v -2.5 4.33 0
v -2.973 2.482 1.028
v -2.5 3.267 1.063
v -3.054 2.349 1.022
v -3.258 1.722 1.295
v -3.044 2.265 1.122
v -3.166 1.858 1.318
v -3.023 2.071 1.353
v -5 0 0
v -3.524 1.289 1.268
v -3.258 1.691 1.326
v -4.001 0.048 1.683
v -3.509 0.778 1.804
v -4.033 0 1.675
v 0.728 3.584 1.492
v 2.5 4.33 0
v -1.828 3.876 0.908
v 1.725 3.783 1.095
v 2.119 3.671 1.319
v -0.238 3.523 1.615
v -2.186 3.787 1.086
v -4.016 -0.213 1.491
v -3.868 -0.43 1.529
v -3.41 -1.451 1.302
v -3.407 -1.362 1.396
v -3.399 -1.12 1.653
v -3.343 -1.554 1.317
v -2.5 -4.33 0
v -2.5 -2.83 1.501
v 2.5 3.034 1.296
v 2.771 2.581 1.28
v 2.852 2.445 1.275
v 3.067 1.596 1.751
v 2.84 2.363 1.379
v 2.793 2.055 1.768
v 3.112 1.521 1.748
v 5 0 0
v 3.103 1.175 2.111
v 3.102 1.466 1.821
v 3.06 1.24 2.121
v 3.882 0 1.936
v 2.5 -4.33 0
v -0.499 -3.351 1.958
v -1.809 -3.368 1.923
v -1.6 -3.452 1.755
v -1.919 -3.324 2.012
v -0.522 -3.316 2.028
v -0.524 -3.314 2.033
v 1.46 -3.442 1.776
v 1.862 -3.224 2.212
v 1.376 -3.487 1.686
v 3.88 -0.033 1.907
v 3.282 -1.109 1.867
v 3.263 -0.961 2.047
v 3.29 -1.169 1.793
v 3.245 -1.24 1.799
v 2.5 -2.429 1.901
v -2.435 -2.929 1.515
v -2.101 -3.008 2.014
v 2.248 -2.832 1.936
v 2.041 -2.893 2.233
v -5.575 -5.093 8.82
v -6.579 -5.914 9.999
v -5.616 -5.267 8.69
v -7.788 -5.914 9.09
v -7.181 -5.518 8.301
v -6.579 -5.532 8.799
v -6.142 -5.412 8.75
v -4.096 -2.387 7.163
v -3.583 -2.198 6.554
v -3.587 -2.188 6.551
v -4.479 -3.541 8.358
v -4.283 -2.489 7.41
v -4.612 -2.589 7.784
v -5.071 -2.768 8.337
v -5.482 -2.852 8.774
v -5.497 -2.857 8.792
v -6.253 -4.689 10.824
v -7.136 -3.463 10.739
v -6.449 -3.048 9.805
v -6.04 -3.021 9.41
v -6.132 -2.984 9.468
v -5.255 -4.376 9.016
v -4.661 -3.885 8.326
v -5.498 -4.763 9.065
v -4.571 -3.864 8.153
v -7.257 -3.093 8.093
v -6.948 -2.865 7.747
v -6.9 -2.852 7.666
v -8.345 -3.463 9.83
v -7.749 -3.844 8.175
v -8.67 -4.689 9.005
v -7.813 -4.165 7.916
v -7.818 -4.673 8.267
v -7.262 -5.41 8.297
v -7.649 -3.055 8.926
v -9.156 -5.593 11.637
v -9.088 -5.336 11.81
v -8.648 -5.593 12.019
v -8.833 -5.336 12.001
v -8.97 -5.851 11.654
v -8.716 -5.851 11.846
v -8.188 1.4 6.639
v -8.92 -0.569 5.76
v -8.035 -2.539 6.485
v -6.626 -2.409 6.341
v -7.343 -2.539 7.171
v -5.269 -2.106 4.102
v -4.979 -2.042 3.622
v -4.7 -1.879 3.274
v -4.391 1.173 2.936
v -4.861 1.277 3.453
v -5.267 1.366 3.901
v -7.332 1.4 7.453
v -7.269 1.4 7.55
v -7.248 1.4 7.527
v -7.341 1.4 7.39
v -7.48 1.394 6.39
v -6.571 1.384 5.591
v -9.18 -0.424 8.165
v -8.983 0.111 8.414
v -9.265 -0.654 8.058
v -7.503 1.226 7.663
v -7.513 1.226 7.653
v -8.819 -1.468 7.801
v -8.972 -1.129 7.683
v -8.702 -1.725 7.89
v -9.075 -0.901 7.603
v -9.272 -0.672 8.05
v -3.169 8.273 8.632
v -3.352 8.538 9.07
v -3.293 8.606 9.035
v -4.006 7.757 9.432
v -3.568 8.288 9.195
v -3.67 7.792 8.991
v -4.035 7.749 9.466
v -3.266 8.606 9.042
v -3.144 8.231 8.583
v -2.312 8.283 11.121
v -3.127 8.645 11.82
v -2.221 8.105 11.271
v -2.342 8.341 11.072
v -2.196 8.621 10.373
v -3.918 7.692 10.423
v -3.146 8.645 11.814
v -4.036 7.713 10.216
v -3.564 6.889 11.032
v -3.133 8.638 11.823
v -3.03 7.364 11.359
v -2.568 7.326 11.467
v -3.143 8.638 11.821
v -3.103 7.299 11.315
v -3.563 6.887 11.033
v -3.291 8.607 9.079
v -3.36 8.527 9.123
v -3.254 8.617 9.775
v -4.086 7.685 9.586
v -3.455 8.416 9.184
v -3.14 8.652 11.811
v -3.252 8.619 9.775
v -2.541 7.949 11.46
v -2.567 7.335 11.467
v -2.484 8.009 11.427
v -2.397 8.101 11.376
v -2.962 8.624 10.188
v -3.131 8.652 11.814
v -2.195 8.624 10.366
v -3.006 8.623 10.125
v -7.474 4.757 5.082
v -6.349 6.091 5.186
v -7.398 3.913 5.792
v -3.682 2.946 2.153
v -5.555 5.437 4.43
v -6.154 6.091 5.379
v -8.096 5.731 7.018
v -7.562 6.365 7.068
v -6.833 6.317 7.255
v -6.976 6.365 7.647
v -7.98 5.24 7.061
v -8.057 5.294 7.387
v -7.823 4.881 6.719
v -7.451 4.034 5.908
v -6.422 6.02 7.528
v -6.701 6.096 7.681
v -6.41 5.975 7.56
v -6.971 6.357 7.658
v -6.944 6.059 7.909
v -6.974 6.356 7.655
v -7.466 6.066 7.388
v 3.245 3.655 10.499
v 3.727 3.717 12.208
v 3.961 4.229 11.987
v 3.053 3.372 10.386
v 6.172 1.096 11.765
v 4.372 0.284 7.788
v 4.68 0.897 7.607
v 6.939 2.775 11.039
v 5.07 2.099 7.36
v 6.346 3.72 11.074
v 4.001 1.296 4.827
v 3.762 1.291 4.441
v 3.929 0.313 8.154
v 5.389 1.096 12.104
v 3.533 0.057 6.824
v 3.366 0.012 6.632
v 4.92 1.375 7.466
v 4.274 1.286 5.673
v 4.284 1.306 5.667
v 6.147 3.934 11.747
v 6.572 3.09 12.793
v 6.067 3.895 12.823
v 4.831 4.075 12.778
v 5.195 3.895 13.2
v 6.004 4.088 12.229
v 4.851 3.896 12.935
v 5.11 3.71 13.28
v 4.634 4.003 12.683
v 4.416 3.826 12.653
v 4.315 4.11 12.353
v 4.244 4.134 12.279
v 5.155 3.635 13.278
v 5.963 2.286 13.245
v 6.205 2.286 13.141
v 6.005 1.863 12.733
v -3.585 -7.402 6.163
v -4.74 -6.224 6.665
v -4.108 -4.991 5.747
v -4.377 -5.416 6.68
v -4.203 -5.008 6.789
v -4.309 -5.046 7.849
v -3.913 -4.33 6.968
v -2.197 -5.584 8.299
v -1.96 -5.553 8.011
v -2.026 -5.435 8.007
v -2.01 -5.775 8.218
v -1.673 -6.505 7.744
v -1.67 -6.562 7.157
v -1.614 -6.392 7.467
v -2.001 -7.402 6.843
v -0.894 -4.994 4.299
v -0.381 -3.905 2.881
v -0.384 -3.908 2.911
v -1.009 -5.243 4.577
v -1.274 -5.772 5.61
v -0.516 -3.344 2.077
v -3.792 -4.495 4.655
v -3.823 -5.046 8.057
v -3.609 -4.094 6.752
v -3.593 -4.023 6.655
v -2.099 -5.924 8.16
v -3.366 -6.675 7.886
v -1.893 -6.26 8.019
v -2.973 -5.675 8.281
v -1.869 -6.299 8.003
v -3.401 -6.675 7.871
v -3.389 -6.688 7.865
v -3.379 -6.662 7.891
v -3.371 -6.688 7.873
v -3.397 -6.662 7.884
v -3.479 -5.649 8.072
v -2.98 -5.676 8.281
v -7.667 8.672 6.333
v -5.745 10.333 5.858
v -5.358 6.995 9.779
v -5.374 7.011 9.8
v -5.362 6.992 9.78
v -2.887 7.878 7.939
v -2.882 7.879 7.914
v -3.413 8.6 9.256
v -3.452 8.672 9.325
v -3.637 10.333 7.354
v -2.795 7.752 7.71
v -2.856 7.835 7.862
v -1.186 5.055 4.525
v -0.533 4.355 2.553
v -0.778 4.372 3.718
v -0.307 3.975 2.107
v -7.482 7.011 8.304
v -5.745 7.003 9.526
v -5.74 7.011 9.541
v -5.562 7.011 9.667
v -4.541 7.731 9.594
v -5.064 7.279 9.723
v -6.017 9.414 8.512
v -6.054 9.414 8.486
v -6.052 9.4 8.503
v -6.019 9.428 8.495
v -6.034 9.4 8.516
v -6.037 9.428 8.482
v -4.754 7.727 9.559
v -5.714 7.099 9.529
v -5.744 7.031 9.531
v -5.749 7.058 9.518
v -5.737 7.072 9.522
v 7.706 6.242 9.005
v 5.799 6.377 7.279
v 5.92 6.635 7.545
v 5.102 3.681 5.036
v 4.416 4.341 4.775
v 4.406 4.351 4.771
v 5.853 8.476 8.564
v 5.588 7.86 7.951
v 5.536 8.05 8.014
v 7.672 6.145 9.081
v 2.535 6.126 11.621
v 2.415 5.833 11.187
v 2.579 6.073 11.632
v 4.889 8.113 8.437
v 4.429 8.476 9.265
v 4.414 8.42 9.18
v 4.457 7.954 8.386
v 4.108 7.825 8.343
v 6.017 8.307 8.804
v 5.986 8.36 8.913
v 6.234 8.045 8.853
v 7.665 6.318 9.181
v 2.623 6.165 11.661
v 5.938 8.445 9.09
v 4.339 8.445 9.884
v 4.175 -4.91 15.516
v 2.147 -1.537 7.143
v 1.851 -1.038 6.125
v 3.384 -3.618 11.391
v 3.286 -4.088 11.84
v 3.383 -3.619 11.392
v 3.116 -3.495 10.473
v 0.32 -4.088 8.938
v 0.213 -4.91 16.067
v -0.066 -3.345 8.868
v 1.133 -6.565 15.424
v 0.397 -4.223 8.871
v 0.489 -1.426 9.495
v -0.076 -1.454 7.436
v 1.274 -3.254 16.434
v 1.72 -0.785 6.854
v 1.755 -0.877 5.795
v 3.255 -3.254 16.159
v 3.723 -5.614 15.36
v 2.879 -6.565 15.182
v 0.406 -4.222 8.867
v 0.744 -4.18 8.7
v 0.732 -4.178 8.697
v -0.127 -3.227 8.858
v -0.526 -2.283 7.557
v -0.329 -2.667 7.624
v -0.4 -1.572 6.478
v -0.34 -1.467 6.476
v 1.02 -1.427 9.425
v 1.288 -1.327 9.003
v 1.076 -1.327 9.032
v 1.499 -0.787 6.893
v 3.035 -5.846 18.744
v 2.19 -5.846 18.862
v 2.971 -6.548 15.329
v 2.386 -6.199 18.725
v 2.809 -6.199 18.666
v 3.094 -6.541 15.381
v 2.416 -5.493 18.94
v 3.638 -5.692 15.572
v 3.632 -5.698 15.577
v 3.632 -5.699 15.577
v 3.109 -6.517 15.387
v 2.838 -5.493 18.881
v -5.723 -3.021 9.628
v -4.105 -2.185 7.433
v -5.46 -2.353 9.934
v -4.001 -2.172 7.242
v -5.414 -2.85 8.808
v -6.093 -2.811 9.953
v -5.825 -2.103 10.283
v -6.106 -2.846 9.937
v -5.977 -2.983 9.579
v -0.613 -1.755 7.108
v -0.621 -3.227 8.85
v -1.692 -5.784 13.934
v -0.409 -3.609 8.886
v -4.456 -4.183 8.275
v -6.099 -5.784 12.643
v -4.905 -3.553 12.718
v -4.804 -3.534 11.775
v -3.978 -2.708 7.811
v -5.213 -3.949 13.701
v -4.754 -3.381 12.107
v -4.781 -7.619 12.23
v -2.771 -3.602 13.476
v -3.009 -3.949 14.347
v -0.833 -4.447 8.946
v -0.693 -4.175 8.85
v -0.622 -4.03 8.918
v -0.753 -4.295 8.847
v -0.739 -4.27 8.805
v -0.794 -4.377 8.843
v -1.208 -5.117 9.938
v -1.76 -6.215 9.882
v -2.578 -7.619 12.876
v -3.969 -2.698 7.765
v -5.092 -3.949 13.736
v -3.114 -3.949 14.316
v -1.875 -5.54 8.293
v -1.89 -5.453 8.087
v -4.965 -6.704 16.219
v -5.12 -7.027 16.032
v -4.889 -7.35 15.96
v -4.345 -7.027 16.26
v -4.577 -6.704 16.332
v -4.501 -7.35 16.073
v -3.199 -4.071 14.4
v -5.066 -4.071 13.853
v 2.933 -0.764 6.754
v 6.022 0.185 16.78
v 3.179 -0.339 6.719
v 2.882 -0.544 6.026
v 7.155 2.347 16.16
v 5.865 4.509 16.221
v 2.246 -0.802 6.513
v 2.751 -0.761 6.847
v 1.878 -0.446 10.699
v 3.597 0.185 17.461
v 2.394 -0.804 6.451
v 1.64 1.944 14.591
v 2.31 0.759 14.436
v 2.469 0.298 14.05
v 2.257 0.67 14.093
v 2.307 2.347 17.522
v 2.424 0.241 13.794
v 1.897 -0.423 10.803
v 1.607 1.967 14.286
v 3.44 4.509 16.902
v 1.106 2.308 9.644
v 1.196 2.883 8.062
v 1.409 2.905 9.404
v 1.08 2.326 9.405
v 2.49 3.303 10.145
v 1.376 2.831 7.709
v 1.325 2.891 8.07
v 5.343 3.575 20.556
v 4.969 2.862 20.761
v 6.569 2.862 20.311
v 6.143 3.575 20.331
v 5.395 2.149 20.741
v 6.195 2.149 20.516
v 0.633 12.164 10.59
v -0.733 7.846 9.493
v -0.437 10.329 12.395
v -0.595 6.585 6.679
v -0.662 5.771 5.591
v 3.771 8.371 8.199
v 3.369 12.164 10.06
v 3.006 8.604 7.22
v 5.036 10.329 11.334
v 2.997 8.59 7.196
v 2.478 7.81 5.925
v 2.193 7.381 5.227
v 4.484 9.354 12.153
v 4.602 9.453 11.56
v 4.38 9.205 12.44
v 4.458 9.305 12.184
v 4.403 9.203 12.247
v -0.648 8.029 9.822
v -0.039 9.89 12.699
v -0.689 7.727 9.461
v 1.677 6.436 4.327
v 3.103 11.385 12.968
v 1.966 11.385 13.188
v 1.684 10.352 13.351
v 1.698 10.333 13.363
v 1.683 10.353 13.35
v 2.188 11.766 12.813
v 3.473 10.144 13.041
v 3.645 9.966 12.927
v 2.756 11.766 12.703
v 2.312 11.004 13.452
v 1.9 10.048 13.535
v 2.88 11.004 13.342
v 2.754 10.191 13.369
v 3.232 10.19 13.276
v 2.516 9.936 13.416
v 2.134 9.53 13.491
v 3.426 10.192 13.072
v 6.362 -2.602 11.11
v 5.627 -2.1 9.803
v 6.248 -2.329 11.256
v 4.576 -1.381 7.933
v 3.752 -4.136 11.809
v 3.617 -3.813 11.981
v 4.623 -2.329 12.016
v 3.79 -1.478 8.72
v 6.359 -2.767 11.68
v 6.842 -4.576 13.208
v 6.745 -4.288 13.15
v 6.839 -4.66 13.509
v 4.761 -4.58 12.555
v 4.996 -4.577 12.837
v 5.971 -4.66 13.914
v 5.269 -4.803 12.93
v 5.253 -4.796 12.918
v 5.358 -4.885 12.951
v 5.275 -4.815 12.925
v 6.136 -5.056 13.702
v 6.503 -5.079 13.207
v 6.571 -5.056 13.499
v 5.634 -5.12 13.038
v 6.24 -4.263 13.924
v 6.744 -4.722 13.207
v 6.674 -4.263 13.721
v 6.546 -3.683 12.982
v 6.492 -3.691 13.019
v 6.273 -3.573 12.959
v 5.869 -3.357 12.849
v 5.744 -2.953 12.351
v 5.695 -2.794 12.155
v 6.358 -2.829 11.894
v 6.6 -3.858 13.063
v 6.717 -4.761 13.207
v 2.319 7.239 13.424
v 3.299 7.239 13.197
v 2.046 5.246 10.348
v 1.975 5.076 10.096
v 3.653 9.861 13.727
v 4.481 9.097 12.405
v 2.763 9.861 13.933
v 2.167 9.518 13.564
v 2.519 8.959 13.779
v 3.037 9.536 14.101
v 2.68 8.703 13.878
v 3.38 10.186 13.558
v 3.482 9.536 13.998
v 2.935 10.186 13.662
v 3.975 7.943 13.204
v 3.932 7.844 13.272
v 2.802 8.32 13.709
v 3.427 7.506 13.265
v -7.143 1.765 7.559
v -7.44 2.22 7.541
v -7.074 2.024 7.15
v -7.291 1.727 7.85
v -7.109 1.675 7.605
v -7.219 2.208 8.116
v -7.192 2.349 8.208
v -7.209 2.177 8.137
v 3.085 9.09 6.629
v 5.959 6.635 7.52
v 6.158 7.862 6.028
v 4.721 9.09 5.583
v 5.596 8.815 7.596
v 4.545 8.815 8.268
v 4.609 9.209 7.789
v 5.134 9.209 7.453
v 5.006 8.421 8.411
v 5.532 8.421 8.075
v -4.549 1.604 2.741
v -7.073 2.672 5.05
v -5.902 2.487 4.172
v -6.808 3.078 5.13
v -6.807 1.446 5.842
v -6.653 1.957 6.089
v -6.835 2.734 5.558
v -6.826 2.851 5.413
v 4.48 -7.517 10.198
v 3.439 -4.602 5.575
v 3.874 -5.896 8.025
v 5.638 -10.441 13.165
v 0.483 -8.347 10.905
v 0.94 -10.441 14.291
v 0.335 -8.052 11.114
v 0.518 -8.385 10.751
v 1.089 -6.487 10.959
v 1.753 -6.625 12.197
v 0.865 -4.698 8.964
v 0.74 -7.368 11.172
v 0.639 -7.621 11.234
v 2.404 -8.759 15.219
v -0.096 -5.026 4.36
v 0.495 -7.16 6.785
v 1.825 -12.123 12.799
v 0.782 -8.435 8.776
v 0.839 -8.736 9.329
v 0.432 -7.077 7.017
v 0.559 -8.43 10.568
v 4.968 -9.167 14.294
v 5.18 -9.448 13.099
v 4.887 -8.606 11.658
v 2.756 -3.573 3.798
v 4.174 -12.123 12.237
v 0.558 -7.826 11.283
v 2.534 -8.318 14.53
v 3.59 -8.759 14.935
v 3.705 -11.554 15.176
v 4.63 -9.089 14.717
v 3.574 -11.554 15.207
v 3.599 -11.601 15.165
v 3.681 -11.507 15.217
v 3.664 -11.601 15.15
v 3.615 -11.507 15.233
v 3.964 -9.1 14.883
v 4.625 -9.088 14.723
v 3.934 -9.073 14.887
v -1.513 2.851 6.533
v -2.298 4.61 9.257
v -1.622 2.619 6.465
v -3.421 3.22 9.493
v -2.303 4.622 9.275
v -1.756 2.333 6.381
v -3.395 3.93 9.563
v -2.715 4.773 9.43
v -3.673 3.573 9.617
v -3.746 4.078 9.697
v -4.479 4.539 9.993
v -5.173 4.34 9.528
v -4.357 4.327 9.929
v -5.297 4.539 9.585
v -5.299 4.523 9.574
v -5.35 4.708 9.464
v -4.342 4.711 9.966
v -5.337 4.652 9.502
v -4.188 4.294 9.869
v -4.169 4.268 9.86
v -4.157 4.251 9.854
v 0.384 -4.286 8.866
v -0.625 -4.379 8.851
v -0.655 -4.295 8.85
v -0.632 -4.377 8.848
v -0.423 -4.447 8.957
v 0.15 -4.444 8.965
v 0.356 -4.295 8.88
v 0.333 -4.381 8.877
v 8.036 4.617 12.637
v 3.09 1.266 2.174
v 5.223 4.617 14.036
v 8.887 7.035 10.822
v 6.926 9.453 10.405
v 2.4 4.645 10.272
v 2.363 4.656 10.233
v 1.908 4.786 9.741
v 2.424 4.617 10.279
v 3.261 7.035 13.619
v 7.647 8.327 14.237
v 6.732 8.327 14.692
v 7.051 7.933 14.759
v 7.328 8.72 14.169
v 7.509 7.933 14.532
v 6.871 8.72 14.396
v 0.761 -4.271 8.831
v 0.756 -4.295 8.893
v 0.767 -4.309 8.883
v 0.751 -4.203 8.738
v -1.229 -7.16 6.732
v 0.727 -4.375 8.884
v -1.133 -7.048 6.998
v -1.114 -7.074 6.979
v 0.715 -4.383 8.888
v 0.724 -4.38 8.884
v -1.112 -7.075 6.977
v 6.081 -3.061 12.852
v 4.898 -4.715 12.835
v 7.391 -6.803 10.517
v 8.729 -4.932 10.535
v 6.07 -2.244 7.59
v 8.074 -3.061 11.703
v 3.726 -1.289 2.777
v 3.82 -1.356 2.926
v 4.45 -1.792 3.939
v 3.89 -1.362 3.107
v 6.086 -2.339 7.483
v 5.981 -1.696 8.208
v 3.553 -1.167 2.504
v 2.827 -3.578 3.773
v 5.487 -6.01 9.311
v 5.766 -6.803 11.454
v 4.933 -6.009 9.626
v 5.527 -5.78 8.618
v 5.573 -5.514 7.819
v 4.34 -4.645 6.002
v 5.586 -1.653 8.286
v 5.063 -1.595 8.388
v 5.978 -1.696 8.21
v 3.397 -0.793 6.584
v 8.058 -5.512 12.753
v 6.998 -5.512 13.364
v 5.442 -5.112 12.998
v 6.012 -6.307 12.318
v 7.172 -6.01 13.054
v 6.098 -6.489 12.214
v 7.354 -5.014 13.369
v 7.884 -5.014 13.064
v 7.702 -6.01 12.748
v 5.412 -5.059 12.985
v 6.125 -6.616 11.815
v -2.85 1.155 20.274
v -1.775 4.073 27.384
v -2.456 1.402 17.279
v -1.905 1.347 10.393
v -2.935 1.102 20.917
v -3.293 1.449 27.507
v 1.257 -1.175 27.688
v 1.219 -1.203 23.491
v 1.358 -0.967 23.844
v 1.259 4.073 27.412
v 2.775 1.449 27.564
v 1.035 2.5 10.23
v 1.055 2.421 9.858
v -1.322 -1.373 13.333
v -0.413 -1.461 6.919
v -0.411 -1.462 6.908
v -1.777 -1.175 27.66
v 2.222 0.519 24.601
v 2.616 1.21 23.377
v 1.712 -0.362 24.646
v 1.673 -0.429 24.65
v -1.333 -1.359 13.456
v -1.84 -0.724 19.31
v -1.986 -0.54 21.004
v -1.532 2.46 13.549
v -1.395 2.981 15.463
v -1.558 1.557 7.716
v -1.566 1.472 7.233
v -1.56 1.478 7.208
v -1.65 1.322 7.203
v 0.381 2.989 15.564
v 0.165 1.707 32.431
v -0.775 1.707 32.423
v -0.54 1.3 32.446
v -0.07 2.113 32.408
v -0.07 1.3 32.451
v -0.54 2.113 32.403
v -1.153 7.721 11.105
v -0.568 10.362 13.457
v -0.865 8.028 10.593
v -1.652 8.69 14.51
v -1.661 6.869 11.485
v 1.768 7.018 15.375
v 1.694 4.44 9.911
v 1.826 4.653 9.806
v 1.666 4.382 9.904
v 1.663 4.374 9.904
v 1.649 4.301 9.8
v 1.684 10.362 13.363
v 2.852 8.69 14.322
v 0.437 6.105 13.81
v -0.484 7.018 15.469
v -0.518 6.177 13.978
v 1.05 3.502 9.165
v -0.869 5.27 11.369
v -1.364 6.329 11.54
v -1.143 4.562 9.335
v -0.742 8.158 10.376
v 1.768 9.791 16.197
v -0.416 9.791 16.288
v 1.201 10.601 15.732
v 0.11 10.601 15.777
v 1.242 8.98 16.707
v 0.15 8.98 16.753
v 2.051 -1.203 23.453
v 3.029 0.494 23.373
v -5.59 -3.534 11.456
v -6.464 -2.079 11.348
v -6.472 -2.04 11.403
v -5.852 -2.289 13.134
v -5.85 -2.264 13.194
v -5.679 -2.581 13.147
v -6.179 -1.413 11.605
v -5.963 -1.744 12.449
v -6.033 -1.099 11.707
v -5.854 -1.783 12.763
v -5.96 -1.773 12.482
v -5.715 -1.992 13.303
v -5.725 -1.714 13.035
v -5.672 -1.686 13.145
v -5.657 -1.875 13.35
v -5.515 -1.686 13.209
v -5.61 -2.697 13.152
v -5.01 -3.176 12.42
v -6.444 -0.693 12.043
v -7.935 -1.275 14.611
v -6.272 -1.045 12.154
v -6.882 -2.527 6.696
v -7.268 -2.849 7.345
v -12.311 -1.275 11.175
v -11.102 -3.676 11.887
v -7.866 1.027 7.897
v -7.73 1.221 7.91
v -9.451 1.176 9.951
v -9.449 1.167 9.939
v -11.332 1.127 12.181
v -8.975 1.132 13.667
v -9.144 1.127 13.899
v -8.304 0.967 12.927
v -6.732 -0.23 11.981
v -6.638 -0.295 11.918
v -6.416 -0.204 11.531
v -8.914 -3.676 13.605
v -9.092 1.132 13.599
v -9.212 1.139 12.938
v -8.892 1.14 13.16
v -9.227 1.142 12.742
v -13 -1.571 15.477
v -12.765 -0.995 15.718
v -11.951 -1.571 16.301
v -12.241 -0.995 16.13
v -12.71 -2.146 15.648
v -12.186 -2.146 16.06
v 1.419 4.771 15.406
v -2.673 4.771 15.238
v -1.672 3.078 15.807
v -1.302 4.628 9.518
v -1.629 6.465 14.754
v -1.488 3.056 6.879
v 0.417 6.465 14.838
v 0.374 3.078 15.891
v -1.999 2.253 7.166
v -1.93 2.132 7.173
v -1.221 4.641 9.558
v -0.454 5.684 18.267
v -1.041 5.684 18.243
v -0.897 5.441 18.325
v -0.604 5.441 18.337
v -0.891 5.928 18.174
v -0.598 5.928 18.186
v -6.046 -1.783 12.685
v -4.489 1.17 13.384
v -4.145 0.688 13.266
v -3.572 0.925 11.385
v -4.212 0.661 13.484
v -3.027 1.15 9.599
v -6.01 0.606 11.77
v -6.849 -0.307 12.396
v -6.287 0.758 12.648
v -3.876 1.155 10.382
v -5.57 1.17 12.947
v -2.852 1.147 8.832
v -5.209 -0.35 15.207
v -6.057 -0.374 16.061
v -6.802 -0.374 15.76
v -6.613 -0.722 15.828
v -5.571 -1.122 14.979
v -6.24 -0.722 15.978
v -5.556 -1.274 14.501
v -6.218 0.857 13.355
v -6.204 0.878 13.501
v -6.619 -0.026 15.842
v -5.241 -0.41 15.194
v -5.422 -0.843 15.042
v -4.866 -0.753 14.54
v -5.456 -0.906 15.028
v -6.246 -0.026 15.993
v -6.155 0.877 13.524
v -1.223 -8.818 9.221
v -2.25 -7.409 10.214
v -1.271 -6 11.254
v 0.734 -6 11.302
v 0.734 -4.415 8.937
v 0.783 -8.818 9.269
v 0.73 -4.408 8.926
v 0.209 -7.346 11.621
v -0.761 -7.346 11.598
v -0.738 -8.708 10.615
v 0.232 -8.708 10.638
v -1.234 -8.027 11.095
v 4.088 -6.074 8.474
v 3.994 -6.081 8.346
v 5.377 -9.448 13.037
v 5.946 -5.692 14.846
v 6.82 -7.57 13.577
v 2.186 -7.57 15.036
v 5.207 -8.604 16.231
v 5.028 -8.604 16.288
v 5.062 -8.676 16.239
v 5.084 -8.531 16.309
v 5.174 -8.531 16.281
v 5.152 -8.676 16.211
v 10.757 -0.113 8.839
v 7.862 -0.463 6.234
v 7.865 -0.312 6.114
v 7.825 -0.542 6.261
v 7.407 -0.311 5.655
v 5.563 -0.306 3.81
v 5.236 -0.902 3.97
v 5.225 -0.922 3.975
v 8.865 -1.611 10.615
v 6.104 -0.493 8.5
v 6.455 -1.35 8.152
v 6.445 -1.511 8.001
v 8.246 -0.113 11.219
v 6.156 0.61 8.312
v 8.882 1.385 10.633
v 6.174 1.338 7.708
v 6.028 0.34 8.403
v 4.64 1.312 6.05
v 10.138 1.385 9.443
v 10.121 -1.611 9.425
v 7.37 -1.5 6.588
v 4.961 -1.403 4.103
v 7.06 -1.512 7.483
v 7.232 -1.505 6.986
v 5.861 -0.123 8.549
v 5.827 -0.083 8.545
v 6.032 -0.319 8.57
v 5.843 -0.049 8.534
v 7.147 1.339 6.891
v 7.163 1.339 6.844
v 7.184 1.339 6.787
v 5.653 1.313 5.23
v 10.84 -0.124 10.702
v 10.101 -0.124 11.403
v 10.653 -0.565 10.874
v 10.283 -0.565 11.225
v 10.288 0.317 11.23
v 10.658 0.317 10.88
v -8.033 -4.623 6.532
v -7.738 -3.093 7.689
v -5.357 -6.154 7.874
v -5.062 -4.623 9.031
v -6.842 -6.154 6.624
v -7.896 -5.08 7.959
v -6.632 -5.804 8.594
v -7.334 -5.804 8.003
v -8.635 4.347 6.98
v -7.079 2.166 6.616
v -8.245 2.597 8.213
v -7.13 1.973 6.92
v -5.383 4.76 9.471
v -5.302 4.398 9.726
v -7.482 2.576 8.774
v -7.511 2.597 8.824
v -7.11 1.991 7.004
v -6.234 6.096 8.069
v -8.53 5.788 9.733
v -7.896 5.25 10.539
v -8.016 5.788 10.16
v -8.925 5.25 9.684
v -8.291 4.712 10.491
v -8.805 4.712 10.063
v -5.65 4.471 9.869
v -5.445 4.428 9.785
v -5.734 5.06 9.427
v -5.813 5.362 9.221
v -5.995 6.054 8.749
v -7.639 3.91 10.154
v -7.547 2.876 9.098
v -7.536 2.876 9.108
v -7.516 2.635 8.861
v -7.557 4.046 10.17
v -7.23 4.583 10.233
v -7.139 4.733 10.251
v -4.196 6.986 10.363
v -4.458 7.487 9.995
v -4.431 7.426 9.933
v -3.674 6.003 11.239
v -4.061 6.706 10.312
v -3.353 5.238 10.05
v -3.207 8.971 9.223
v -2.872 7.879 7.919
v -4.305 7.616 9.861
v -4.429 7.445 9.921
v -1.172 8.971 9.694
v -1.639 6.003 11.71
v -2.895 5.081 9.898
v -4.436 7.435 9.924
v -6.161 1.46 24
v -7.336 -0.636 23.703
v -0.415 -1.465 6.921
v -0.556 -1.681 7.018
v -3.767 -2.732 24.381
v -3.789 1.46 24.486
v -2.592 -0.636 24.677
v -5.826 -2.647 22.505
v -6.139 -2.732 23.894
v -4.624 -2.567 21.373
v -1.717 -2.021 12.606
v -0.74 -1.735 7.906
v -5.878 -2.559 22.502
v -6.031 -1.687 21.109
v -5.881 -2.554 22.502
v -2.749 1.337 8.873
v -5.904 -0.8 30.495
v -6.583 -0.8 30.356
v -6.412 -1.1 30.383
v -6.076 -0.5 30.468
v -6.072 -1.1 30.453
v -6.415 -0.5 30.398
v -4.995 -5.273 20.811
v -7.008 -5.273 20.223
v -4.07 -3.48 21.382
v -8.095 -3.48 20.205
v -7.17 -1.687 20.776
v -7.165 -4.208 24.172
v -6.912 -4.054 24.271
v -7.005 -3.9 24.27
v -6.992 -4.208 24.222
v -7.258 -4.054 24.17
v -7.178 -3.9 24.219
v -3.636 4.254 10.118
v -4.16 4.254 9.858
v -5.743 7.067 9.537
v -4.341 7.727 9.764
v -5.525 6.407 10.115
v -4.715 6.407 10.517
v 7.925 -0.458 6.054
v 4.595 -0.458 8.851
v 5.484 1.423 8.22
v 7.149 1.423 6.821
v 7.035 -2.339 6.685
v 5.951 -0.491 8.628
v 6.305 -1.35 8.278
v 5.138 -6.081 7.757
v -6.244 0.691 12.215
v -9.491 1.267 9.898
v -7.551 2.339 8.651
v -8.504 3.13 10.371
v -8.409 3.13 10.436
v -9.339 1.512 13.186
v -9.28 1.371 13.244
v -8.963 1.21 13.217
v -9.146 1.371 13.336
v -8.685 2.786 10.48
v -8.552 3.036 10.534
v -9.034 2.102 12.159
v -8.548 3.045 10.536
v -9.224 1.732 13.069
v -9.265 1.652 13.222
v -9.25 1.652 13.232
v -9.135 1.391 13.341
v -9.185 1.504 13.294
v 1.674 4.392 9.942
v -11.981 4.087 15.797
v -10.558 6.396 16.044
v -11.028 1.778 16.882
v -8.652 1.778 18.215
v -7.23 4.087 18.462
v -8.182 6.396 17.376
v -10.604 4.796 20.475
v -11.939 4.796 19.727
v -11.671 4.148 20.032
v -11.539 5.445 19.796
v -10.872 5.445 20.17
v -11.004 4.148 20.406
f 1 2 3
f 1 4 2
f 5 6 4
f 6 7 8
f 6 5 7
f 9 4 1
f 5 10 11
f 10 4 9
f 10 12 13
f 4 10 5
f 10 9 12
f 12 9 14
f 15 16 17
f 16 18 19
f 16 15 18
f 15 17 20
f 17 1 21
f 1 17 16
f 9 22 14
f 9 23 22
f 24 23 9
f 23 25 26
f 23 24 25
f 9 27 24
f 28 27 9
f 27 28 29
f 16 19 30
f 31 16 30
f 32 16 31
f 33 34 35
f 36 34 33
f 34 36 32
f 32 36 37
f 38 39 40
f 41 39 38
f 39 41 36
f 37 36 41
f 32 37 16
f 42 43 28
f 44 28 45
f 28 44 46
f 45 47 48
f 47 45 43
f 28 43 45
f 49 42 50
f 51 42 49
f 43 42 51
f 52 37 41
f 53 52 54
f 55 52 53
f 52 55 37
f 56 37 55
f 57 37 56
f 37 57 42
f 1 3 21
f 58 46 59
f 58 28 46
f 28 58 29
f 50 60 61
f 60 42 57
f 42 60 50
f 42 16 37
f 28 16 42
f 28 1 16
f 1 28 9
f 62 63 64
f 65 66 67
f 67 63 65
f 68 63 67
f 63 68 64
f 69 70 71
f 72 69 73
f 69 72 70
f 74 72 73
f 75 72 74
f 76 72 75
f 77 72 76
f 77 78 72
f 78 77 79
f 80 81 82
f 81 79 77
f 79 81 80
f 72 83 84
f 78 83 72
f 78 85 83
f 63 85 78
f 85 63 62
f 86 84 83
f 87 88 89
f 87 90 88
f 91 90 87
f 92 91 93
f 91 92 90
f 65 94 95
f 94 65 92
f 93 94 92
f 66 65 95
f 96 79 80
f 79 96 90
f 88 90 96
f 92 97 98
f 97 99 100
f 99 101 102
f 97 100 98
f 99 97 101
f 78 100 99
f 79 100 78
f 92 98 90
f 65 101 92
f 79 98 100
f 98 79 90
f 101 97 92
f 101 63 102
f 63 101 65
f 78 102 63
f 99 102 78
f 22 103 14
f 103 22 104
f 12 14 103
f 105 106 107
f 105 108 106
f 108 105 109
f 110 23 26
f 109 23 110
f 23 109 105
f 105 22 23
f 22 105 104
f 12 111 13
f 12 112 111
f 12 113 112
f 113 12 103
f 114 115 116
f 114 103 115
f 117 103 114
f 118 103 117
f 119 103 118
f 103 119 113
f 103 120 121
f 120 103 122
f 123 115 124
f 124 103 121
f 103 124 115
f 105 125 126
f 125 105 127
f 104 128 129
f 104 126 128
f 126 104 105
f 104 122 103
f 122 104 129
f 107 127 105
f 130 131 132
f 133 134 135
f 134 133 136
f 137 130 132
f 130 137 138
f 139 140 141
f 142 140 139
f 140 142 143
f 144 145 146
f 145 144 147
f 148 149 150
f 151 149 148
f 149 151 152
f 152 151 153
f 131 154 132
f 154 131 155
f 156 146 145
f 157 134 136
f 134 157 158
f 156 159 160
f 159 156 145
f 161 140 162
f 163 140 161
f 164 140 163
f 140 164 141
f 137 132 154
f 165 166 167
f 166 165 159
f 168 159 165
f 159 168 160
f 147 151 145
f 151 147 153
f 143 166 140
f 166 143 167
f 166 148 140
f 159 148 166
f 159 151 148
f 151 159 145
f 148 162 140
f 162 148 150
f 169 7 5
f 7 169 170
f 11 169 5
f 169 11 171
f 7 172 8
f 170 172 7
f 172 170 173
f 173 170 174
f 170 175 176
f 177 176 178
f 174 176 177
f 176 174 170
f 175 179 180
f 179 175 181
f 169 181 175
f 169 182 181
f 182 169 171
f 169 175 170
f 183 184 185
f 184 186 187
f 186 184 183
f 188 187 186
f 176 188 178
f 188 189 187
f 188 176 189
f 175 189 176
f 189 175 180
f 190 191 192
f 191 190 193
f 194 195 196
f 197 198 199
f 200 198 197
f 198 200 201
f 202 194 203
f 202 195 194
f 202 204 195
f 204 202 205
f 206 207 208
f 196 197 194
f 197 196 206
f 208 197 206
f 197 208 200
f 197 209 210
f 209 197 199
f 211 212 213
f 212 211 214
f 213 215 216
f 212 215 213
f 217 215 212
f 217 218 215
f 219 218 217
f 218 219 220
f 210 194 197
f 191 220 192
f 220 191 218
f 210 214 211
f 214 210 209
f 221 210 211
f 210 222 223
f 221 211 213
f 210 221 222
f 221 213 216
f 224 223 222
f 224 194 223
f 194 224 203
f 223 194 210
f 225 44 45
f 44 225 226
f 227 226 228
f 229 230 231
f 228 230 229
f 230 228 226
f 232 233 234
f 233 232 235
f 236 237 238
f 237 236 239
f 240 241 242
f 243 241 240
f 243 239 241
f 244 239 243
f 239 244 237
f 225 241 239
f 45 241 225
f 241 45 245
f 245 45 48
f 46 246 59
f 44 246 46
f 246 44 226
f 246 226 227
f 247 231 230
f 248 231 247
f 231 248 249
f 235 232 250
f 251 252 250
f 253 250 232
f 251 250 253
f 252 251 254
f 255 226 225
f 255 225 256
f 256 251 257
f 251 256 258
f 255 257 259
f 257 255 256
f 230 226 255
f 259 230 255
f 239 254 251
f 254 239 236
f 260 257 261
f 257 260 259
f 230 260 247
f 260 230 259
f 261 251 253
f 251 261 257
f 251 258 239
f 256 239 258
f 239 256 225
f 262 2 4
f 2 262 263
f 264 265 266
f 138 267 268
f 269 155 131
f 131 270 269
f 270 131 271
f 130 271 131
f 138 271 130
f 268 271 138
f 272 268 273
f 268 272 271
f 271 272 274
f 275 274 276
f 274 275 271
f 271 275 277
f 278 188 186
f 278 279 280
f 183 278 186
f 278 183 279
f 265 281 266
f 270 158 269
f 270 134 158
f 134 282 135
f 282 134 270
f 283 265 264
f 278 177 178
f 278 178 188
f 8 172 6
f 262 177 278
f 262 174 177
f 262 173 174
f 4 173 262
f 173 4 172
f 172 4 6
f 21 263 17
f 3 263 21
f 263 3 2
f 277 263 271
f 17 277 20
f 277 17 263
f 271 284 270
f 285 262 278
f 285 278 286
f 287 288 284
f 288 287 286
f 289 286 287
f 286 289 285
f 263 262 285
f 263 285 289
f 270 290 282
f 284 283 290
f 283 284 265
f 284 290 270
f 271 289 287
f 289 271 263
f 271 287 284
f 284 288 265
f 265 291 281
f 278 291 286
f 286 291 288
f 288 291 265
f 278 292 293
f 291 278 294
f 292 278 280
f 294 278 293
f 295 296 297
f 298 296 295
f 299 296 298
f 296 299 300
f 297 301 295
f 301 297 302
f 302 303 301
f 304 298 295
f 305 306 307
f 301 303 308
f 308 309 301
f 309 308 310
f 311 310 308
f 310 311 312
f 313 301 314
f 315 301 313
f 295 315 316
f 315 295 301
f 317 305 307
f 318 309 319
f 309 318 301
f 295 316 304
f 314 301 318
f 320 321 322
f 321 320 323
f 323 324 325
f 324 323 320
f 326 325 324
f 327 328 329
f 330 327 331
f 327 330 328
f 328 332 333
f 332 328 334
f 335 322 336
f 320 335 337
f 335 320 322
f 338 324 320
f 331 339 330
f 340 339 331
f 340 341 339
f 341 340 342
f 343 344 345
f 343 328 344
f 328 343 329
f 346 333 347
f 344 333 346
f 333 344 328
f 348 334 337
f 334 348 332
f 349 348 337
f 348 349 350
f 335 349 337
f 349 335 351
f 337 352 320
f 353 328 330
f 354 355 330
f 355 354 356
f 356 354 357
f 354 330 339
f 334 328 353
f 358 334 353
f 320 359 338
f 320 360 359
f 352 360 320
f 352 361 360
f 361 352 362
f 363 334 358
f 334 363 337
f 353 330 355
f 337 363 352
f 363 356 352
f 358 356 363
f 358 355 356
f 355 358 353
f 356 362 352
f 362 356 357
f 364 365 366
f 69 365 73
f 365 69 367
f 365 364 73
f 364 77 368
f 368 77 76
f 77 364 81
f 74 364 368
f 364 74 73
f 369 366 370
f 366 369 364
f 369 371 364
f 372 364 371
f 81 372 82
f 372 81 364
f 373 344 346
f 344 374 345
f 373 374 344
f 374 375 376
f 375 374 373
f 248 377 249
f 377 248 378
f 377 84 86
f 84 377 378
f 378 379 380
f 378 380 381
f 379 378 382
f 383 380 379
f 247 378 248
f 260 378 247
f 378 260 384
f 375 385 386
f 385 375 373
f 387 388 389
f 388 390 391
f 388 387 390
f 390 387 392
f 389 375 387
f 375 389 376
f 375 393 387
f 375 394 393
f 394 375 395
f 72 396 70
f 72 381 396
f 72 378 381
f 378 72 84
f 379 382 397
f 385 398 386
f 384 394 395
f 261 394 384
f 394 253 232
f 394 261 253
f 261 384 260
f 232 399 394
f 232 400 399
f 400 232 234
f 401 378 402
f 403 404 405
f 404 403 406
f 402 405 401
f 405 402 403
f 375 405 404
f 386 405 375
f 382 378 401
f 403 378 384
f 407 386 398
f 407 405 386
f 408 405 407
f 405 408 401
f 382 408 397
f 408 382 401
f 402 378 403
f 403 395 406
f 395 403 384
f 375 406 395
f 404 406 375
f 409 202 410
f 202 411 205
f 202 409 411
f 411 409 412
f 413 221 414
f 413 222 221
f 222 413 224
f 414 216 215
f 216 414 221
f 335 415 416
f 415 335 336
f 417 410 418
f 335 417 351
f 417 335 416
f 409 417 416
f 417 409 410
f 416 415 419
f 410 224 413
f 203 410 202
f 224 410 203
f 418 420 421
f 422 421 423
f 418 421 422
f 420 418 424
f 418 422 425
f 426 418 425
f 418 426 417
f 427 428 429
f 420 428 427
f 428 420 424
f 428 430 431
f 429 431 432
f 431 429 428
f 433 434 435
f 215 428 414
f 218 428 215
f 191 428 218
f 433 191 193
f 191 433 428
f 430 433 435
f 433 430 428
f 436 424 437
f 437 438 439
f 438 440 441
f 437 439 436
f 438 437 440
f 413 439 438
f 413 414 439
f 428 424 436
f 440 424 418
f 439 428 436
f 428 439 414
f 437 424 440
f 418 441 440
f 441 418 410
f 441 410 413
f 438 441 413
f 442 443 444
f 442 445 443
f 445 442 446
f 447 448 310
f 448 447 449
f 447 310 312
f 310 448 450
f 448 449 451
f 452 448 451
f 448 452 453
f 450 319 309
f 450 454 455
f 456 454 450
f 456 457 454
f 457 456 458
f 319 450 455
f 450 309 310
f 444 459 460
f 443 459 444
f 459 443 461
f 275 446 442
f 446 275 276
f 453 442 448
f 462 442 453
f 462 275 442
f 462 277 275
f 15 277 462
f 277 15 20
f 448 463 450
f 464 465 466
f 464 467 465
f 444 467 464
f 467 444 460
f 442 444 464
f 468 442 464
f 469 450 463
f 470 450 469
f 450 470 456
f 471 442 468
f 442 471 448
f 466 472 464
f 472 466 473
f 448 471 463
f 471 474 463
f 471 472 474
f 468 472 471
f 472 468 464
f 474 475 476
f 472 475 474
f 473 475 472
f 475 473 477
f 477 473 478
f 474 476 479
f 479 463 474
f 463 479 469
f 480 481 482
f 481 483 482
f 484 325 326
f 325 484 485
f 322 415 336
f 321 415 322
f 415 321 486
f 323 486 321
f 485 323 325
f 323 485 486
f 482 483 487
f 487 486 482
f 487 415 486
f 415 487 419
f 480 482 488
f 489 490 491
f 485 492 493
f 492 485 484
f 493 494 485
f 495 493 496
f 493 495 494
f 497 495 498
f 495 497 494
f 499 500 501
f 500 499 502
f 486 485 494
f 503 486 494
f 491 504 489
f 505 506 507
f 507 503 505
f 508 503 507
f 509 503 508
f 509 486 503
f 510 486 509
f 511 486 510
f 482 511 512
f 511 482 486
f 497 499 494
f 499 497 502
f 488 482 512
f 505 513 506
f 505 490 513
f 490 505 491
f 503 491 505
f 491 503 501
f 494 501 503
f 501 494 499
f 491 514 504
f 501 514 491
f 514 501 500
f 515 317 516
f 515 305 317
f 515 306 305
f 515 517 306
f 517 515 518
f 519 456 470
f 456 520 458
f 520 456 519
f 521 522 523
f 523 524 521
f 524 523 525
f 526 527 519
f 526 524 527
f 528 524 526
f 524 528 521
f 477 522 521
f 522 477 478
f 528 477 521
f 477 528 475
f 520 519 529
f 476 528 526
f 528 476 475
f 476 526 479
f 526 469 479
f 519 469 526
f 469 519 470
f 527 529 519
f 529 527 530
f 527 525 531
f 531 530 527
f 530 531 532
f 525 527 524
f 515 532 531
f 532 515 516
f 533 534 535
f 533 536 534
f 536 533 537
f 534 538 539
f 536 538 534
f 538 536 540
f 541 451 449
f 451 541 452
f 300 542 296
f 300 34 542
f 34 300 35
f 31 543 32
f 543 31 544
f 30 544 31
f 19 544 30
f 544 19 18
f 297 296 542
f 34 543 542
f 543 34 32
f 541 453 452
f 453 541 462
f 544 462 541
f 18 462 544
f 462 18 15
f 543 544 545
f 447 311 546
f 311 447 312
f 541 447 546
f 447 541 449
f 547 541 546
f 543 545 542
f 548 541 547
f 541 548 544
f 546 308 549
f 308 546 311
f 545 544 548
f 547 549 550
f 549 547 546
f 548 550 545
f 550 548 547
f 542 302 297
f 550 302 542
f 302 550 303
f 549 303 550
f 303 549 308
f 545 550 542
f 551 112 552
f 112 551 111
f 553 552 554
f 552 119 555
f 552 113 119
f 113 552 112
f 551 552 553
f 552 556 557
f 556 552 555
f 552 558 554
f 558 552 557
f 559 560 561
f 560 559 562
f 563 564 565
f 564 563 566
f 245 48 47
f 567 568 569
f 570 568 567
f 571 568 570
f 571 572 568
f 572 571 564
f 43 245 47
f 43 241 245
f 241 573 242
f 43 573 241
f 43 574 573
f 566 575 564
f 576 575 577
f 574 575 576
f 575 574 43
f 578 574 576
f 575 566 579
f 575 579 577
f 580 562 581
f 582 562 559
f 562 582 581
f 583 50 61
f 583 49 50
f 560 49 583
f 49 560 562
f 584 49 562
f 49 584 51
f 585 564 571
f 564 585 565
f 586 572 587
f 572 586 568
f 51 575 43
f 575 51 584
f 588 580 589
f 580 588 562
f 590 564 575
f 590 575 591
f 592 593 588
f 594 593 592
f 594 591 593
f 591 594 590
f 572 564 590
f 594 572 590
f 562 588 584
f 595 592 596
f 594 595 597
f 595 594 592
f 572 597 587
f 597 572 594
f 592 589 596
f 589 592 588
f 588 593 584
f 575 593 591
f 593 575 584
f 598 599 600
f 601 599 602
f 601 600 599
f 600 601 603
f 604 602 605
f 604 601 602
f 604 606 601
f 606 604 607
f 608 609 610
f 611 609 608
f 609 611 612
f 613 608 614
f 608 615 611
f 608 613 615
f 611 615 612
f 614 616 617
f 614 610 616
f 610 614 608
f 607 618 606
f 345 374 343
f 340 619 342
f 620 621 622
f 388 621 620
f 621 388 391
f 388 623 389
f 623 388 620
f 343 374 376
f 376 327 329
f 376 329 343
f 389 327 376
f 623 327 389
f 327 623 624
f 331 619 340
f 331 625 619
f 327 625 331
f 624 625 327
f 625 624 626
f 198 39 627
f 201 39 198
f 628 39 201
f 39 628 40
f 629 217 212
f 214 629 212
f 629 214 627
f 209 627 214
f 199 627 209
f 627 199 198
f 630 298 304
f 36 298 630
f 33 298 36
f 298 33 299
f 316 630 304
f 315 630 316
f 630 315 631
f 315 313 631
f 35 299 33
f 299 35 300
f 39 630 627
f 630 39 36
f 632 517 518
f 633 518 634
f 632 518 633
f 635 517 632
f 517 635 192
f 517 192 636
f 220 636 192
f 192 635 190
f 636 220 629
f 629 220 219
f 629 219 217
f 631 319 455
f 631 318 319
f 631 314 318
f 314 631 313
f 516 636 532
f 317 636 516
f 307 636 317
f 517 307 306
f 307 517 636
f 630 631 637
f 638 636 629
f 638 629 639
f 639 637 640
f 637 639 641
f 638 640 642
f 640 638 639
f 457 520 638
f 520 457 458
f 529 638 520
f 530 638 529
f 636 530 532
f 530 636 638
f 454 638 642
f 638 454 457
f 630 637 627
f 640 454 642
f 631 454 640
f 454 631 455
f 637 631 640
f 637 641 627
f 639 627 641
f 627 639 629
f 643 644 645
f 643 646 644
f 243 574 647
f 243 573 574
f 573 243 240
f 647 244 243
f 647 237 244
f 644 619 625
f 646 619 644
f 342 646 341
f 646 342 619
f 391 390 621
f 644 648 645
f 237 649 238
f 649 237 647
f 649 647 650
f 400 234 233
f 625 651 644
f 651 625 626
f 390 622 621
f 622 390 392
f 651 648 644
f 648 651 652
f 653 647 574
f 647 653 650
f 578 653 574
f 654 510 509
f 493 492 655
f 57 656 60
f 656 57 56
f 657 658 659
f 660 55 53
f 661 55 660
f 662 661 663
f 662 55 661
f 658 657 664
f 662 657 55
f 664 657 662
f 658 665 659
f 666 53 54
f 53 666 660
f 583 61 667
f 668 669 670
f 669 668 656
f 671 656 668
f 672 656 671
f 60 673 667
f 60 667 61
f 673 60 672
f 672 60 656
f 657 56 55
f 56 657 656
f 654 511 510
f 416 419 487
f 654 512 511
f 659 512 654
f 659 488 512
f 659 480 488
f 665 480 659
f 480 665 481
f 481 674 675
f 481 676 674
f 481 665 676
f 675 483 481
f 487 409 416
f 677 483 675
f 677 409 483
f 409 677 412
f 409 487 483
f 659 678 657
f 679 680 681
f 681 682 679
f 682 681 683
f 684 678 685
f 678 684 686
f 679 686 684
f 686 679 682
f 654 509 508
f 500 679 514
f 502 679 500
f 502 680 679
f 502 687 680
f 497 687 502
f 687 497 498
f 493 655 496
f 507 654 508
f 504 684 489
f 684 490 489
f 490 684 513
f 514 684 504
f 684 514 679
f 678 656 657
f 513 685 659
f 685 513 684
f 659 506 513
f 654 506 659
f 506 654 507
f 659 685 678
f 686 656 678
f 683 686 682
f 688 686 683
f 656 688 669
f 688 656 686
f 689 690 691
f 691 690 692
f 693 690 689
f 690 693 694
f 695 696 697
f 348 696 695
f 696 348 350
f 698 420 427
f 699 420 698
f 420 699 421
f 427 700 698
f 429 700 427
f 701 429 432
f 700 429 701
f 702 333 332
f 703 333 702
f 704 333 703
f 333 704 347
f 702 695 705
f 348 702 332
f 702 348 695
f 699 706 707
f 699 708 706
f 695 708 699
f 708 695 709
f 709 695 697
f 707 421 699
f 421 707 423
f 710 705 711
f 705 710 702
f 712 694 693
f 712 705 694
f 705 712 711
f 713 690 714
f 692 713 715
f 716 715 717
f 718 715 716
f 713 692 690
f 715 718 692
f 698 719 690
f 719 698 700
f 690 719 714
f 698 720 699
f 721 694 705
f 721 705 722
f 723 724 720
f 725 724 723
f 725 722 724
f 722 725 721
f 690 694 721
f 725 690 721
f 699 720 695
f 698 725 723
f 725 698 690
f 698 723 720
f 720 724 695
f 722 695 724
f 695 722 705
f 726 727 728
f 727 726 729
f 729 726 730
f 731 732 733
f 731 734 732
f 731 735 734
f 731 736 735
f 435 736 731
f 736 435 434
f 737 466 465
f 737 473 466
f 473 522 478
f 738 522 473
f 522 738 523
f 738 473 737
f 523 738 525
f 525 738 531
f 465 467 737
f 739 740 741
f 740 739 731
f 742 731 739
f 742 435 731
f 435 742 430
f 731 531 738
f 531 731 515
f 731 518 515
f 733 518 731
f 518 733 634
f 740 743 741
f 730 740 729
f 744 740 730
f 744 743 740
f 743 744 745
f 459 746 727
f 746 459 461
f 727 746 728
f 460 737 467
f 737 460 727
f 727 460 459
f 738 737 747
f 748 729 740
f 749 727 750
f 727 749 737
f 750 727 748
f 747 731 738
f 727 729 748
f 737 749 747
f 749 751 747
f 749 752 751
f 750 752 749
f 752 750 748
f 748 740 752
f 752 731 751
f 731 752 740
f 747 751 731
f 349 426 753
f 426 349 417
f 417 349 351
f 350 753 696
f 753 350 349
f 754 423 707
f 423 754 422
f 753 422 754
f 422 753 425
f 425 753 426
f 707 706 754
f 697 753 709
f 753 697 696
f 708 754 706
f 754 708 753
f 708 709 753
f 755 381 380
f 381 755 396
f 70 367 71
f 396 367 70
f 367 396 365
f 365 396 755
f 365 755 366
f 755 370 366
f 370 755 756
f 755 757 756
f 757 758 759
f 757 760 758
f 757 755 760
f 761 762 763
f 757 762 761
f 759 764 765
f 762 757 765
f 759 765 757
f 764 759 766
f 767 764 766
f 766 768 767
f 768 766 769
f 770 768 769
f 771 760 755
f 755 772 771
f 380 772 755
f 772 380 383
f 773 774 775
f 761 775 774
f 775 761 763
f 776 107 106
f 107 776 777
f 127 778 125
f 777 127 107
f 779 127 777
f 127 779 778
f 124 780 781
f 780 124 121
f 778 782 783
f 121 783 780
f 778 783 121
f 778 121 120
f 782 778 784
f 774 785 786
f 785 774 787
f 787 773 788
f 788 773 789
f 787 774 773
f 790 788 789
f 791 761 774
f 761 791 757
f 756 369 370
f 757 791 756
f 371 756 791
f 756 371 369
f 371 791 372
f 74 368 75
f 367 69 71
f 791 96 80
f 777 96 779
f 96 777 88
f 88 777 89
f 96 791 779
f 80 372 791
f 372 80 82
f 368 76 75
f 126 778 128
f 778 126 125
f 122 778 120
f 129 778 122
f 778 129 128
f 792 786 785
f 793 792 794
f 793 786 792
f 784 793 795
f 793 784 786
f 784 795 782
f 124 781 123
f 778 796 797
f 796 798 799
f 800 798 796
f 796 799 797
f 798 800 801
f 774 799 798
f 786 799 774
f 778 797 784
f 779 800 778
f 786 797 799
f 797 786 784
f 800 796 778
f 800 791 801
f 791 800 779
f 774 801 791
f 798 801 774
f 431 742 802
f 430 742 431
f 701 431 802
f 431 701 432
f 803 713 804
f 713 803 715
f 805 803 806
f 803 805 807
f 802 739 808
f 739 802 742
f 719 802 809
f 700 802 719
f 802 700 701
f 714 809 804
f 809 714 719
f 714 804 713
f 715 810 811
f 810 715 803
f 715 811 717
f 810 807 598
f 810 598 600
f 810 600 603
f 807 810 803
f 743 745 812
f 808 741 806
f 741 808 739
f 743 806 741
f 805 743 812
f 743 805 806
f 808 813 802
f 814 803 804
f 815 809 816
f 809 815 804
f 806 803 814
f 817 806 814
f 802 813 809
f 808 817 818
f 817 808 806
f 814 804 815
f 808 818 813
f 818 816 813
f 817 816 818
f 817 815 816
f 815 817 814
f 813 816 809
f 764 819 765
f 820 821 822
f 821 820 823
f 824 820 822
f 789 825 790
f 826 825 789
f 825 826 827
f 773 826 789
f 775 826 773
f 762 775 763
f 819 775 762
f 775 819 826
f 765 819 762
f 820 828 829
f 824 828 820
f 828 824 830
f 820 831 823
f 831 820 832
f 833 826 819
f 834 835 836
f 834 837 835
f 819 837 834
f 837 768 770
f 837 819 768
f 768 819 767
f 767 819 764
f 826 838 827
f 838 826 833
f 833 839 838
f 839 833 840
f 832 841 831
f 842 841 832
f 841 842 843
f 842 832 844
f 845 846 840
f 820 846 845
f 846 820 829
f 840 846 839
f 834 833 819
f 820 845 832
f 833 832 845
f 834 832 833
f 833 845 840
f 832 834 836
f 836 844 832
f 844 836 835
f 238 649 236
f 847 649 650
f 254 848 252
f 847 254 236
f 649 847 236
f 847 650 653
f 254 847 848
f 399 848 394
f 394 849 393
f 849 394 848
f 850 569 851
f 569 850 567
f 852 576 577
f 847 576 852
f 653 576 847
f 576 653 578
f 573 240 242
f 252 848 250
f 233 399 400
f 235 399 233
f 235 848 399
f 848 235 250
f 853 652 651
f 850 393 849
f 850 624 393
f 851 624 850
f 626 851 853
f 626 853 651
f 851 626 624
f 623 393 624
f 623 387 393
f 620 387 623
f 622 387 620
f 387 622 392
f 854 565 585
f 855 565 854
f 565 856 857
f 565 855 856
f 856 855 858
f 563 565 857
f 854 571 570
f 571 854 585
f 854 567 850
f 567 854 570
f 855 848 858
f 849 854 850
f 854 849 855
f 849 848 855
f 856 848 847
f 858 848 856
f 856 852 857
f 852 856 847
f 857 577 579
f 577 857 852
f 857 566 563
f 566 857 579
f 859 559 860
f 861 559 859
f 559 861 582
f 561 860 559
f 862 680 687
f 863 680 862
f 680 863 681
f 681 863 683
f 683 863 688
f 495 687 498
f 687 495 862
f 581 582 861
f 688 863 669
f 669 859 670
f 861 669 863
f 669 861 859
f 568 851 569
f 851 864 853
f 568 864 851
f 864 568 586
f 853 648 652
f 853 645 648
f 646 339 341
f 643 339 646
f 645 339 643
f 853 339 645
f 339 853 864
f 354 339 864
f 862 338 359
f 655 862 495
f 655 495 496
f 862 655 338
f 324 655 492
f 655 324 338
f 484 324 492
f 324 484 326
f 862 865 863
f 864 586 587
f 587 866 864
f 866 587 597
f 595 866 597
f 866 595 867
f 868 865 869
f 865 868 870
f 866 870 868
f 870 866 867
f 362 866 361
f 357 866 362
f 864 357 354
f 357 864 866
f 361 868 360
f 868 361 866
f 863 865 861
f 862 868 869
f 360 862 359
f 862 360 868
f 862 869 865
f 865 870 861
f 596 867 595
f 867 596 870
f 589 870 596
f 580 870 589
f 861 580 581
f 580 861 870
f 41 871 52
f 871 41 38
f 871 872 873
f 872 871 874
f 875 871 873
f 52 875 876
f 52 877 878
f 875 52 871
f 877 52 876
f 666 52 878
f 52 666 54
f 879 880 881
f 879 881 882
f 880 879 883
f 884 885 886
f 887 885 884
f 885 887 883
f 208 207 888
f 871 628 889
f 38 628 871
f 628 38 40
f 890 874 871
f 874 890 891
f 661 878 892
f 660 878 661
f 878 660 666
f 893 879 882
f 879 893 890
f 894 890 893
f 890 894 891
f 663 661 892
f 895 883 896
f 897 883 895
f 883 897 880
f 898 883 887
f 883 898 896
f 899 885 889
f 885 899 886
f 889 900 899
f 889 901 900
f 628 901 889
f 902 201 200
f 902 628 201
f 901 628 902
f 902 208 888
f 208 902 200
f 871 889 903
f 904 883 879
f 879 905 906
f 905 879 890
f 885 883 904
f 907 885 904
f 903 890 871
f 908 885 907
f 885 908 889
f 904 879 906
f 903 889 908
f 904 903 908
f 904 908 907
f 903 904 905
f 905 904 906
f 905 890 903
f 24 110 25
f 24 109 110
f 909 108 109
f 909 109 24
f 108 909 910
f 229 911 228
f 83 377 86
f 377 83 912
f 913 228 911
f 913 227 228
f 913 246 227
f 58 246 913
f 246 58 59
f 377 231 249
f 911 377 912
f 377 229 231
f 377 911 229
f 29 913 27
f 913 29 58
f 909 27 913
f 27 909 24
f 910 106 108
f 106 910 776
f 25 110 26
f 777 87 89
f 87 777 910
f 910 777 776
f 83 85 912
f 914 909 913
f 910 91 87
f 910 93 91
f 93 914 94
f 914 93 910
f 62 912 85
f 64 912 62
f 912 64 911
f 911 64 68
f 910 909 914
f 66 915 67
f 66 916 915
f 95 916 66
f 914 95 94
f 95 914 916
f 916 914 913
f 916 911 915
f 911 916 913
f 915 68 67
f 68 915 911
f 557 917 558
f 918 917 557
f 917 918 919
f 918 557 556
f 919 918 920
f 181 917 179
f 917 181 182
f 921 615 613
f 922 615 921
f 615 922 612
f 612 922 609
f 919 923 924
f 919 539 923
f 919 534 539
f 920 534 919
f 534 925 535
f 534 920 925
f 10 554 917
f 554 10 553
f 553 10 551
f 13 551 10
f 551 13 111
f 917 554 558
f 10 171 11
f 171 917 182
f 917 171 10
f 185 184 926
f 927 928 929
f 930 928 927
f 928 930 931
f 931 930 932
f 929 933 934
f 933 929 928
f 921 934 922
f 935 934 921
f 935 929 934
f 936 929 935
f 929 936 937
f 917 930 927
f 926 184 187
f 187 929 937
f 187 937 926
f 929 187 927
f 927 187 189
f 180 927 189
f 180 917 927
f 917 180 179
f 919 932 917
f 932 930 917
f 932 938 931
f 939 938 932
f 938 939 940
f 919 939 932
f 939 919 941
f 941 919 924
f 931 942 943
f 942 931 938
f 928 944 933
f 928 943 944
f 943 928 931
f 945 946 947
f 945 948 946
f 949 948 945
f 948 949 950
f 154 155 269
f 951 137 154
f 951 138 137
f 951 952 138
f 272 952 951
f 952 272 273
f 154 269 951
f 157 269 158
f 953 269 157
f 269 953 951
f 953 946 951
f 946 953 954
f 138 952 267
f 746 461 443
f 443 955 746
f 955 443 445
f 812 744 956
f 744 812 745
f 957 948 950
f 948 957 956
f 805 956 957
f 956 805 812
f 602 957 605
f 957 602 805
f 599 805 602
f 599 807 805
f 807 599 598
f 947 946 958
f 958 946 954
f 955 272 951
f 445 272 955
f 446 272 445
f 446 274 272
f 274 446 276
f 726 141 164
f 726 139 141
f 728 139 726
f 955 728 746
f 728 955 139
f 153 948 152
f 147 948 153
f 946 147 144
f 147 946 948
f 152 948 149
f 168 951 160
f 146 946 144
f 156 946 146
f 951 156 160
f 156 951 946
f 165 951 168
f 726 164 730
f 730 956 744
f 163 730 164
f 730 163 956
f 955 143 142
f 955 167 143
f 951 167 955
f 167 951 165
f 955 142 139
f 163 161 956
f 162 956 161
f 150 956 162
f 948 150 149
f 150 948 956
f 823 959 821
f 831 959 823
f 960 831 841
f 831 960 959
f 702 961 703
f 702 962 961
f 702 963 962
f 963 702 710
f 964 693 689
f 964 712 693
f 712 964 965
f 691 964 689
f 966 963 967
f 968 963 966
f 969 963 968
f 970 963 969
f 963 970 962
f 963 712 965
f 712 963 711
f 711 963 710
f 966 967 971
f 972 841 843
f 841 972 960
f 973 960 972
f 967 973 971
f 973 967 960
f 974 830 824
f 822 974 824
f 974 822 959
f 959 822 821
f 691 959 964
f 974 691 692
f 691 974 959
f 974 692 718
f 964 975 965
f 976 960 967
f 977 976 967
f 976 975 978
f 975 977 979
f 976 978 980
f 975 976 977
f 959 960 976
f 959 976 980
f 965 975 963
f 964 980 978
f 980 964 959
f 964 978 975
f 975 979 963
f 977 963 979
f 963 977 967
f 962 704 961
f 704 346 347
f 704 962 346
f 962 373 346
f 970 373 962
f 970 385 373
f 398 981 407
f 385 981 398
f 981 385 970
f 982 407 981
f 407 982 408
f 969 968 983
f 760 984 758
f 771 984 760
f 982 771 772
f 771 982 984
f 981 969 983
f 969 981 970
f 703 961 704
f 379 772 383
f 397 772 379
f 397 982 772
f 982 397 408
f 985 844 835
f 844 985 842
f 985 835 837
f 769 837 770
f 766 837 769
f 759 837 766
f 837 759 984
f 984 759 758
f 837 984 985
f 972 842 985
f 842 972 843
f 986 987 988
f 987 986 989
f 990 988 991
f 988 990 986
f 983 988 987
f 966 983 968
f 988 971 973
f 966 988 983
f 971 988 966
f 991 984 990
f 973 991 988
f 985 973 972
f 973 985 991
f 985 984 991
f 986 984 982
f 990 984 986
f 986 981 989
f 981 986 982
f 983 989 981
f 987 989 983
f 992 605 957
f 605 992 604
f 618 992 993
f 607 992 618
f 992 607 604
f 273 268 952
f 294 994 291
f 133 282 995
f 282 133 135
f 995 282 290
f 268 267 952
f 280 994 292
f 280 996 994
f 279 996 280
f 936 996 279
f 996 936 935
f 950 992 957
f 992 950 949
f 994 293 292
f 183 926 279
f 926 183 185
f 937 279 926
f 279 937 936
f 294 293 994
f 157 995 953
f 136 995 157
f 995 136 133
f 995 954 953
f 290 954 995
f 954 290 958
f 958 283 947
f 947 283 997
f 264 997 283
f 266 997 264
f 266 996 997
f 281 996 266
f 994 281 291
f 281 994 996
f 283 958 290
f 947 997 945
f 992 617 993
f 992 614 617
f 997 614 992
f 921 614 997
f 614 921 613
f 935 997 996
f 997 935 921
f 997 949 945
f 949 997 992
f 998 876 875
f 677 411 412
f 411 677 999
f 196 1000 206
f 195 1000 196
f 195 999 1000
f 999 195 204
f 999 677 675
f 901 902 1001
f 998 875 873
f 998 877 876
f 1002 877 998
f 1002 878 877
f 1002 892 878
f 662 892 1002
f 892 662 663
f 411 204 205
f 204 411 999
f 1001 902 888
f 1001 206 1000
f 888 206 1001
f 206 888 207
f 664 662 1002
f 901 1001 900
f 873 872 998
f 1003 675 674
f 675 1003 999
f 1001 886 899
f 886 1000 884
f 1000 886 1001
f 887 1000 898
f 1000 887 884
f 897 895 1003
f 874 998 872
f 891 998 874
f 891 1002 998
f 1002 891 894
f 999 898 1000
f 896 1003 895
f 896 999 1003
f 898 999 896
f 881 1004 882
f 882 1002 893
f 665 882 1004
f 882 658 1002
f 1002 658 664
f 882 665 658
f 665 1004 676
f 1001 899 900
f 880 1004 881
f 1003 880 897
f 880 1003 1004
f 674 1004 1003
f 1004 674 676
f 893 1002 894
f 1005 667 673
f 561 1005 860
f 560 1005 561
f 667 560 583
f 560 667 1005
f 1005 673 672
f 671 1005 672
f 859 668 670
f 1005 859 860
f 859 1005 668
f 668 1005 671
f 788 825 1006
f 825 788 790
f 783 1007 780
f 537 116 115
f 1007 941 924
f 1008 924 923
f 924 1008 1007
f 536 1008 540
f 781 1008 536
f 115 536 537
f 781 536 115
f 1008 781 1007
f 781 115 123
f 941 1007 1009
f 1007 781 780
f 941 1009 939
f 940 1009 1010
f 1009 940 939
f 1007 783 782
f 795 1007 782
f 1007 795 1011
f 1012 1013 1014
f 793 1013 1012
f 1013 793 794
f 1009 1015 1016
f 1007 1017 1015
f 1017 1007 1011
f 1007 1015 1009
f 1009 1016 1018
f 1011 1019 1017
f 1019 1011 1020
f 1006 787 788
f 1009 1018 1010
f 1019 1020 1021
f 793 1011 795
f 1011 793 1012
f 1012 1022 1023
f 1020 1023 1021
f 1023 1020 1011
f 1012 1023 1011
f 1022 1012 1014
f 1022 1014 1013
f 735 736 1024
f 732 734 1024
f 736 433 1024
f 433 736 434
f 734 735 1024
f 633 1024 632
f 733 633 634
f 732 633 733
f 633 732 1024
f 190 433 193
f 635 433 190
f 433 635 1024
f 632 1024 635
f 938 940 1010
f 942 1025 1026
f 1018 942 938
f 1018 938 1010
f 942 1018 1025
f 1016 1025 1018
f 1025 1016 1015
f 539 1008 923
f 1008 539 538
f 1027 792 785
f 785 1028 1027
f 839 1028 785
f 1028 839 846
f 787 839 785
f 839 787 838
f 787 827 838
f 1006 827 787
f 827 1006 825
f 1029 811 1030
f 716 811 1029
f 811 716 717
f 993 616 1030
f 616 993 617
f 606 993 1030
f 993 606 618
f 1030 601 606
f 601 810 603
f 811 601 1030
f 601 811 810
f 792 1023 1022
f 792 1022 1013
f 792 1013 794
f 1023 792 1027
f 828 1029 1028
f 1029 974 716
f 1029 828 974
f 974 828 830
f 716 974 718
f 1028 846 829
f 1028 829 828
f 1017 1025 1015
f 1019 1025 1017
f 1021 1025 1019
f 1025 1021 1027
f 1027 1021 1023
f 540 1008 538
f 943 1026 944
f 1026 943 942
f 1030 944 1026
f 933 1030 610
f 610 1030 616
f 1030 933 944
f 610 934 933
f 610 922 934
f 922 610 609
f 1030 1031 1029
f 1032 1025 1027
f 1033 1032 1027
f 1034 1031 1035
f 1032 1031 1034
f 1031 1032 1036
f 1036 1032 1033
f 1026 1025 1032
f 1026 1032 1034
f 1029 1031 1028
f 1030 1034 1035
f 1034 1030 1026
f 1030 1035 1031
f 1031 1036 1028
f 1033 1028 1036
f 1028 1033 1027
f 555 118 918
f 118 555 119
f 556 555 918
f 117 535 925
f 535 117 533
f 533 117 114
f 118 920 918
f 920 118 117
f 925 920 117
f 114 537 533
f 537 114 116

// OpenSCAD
/*

Random crystal generator for Thingiverse Customizer

Fernando Jerez 2016

*/

// This is only to force Customizer create many files. Changes doesn´t matter. Just click CREATE THING
part = "one"; // [one:Crystal #1, two:Crystal #2, three:Crystal #3, four:Crystal #4,five:Crystal #5,six:Crystal #6,seven:Crystal #7,eight:Crystal #8,nine:Crystal #9,ten:Crystal #10]

crystalrock();
 



module crystalrock(){
    union(){
        semisphere(5,$fn=6);
        for(i=[1:50]){
            angleX = 45;
            angleY = 45;
            g1=rands(-angleX,angleX,1)[0];
            g2=rands(-angleY,angleY,1)[0];
        
            lados=6;//round(rands(4,8,1)[0]);
            radio1=rands(1,2,1)[0];
            radio2=rands(1.1,1.6,1)[0]*radio1;
            radio3 = rands(0,0.5,1)[0]*radio2;
            altura=radio1*rands(1,2,1)[0]*5*(0.5+pow((abs(cos(g1)*cos(g2))),4));
            pico=rands(0.1,0.3,1)[0]*altura;    
        
            rotate([g1,g2,0])
            translate([0,0,3])
            crystal(lados,radio1,radio2,radio3,altura,pico);
        }
    }
}




module crystal(lados,radio1,radio2,radio3,altura,pico){
    cylinder(r1=radio1,r2=radio2,h=altura,$fn=lados);
    translate([0,0,altura])
    cylinder(r1=radio2,r2=radio3,h=pico,$fn=lados);
    
}

module semisphere(r){
    difference(){
        sphere(r); 
        translate([0,0,-r]) cube([2*r,2*r,2*r],center = true);
    }
}
